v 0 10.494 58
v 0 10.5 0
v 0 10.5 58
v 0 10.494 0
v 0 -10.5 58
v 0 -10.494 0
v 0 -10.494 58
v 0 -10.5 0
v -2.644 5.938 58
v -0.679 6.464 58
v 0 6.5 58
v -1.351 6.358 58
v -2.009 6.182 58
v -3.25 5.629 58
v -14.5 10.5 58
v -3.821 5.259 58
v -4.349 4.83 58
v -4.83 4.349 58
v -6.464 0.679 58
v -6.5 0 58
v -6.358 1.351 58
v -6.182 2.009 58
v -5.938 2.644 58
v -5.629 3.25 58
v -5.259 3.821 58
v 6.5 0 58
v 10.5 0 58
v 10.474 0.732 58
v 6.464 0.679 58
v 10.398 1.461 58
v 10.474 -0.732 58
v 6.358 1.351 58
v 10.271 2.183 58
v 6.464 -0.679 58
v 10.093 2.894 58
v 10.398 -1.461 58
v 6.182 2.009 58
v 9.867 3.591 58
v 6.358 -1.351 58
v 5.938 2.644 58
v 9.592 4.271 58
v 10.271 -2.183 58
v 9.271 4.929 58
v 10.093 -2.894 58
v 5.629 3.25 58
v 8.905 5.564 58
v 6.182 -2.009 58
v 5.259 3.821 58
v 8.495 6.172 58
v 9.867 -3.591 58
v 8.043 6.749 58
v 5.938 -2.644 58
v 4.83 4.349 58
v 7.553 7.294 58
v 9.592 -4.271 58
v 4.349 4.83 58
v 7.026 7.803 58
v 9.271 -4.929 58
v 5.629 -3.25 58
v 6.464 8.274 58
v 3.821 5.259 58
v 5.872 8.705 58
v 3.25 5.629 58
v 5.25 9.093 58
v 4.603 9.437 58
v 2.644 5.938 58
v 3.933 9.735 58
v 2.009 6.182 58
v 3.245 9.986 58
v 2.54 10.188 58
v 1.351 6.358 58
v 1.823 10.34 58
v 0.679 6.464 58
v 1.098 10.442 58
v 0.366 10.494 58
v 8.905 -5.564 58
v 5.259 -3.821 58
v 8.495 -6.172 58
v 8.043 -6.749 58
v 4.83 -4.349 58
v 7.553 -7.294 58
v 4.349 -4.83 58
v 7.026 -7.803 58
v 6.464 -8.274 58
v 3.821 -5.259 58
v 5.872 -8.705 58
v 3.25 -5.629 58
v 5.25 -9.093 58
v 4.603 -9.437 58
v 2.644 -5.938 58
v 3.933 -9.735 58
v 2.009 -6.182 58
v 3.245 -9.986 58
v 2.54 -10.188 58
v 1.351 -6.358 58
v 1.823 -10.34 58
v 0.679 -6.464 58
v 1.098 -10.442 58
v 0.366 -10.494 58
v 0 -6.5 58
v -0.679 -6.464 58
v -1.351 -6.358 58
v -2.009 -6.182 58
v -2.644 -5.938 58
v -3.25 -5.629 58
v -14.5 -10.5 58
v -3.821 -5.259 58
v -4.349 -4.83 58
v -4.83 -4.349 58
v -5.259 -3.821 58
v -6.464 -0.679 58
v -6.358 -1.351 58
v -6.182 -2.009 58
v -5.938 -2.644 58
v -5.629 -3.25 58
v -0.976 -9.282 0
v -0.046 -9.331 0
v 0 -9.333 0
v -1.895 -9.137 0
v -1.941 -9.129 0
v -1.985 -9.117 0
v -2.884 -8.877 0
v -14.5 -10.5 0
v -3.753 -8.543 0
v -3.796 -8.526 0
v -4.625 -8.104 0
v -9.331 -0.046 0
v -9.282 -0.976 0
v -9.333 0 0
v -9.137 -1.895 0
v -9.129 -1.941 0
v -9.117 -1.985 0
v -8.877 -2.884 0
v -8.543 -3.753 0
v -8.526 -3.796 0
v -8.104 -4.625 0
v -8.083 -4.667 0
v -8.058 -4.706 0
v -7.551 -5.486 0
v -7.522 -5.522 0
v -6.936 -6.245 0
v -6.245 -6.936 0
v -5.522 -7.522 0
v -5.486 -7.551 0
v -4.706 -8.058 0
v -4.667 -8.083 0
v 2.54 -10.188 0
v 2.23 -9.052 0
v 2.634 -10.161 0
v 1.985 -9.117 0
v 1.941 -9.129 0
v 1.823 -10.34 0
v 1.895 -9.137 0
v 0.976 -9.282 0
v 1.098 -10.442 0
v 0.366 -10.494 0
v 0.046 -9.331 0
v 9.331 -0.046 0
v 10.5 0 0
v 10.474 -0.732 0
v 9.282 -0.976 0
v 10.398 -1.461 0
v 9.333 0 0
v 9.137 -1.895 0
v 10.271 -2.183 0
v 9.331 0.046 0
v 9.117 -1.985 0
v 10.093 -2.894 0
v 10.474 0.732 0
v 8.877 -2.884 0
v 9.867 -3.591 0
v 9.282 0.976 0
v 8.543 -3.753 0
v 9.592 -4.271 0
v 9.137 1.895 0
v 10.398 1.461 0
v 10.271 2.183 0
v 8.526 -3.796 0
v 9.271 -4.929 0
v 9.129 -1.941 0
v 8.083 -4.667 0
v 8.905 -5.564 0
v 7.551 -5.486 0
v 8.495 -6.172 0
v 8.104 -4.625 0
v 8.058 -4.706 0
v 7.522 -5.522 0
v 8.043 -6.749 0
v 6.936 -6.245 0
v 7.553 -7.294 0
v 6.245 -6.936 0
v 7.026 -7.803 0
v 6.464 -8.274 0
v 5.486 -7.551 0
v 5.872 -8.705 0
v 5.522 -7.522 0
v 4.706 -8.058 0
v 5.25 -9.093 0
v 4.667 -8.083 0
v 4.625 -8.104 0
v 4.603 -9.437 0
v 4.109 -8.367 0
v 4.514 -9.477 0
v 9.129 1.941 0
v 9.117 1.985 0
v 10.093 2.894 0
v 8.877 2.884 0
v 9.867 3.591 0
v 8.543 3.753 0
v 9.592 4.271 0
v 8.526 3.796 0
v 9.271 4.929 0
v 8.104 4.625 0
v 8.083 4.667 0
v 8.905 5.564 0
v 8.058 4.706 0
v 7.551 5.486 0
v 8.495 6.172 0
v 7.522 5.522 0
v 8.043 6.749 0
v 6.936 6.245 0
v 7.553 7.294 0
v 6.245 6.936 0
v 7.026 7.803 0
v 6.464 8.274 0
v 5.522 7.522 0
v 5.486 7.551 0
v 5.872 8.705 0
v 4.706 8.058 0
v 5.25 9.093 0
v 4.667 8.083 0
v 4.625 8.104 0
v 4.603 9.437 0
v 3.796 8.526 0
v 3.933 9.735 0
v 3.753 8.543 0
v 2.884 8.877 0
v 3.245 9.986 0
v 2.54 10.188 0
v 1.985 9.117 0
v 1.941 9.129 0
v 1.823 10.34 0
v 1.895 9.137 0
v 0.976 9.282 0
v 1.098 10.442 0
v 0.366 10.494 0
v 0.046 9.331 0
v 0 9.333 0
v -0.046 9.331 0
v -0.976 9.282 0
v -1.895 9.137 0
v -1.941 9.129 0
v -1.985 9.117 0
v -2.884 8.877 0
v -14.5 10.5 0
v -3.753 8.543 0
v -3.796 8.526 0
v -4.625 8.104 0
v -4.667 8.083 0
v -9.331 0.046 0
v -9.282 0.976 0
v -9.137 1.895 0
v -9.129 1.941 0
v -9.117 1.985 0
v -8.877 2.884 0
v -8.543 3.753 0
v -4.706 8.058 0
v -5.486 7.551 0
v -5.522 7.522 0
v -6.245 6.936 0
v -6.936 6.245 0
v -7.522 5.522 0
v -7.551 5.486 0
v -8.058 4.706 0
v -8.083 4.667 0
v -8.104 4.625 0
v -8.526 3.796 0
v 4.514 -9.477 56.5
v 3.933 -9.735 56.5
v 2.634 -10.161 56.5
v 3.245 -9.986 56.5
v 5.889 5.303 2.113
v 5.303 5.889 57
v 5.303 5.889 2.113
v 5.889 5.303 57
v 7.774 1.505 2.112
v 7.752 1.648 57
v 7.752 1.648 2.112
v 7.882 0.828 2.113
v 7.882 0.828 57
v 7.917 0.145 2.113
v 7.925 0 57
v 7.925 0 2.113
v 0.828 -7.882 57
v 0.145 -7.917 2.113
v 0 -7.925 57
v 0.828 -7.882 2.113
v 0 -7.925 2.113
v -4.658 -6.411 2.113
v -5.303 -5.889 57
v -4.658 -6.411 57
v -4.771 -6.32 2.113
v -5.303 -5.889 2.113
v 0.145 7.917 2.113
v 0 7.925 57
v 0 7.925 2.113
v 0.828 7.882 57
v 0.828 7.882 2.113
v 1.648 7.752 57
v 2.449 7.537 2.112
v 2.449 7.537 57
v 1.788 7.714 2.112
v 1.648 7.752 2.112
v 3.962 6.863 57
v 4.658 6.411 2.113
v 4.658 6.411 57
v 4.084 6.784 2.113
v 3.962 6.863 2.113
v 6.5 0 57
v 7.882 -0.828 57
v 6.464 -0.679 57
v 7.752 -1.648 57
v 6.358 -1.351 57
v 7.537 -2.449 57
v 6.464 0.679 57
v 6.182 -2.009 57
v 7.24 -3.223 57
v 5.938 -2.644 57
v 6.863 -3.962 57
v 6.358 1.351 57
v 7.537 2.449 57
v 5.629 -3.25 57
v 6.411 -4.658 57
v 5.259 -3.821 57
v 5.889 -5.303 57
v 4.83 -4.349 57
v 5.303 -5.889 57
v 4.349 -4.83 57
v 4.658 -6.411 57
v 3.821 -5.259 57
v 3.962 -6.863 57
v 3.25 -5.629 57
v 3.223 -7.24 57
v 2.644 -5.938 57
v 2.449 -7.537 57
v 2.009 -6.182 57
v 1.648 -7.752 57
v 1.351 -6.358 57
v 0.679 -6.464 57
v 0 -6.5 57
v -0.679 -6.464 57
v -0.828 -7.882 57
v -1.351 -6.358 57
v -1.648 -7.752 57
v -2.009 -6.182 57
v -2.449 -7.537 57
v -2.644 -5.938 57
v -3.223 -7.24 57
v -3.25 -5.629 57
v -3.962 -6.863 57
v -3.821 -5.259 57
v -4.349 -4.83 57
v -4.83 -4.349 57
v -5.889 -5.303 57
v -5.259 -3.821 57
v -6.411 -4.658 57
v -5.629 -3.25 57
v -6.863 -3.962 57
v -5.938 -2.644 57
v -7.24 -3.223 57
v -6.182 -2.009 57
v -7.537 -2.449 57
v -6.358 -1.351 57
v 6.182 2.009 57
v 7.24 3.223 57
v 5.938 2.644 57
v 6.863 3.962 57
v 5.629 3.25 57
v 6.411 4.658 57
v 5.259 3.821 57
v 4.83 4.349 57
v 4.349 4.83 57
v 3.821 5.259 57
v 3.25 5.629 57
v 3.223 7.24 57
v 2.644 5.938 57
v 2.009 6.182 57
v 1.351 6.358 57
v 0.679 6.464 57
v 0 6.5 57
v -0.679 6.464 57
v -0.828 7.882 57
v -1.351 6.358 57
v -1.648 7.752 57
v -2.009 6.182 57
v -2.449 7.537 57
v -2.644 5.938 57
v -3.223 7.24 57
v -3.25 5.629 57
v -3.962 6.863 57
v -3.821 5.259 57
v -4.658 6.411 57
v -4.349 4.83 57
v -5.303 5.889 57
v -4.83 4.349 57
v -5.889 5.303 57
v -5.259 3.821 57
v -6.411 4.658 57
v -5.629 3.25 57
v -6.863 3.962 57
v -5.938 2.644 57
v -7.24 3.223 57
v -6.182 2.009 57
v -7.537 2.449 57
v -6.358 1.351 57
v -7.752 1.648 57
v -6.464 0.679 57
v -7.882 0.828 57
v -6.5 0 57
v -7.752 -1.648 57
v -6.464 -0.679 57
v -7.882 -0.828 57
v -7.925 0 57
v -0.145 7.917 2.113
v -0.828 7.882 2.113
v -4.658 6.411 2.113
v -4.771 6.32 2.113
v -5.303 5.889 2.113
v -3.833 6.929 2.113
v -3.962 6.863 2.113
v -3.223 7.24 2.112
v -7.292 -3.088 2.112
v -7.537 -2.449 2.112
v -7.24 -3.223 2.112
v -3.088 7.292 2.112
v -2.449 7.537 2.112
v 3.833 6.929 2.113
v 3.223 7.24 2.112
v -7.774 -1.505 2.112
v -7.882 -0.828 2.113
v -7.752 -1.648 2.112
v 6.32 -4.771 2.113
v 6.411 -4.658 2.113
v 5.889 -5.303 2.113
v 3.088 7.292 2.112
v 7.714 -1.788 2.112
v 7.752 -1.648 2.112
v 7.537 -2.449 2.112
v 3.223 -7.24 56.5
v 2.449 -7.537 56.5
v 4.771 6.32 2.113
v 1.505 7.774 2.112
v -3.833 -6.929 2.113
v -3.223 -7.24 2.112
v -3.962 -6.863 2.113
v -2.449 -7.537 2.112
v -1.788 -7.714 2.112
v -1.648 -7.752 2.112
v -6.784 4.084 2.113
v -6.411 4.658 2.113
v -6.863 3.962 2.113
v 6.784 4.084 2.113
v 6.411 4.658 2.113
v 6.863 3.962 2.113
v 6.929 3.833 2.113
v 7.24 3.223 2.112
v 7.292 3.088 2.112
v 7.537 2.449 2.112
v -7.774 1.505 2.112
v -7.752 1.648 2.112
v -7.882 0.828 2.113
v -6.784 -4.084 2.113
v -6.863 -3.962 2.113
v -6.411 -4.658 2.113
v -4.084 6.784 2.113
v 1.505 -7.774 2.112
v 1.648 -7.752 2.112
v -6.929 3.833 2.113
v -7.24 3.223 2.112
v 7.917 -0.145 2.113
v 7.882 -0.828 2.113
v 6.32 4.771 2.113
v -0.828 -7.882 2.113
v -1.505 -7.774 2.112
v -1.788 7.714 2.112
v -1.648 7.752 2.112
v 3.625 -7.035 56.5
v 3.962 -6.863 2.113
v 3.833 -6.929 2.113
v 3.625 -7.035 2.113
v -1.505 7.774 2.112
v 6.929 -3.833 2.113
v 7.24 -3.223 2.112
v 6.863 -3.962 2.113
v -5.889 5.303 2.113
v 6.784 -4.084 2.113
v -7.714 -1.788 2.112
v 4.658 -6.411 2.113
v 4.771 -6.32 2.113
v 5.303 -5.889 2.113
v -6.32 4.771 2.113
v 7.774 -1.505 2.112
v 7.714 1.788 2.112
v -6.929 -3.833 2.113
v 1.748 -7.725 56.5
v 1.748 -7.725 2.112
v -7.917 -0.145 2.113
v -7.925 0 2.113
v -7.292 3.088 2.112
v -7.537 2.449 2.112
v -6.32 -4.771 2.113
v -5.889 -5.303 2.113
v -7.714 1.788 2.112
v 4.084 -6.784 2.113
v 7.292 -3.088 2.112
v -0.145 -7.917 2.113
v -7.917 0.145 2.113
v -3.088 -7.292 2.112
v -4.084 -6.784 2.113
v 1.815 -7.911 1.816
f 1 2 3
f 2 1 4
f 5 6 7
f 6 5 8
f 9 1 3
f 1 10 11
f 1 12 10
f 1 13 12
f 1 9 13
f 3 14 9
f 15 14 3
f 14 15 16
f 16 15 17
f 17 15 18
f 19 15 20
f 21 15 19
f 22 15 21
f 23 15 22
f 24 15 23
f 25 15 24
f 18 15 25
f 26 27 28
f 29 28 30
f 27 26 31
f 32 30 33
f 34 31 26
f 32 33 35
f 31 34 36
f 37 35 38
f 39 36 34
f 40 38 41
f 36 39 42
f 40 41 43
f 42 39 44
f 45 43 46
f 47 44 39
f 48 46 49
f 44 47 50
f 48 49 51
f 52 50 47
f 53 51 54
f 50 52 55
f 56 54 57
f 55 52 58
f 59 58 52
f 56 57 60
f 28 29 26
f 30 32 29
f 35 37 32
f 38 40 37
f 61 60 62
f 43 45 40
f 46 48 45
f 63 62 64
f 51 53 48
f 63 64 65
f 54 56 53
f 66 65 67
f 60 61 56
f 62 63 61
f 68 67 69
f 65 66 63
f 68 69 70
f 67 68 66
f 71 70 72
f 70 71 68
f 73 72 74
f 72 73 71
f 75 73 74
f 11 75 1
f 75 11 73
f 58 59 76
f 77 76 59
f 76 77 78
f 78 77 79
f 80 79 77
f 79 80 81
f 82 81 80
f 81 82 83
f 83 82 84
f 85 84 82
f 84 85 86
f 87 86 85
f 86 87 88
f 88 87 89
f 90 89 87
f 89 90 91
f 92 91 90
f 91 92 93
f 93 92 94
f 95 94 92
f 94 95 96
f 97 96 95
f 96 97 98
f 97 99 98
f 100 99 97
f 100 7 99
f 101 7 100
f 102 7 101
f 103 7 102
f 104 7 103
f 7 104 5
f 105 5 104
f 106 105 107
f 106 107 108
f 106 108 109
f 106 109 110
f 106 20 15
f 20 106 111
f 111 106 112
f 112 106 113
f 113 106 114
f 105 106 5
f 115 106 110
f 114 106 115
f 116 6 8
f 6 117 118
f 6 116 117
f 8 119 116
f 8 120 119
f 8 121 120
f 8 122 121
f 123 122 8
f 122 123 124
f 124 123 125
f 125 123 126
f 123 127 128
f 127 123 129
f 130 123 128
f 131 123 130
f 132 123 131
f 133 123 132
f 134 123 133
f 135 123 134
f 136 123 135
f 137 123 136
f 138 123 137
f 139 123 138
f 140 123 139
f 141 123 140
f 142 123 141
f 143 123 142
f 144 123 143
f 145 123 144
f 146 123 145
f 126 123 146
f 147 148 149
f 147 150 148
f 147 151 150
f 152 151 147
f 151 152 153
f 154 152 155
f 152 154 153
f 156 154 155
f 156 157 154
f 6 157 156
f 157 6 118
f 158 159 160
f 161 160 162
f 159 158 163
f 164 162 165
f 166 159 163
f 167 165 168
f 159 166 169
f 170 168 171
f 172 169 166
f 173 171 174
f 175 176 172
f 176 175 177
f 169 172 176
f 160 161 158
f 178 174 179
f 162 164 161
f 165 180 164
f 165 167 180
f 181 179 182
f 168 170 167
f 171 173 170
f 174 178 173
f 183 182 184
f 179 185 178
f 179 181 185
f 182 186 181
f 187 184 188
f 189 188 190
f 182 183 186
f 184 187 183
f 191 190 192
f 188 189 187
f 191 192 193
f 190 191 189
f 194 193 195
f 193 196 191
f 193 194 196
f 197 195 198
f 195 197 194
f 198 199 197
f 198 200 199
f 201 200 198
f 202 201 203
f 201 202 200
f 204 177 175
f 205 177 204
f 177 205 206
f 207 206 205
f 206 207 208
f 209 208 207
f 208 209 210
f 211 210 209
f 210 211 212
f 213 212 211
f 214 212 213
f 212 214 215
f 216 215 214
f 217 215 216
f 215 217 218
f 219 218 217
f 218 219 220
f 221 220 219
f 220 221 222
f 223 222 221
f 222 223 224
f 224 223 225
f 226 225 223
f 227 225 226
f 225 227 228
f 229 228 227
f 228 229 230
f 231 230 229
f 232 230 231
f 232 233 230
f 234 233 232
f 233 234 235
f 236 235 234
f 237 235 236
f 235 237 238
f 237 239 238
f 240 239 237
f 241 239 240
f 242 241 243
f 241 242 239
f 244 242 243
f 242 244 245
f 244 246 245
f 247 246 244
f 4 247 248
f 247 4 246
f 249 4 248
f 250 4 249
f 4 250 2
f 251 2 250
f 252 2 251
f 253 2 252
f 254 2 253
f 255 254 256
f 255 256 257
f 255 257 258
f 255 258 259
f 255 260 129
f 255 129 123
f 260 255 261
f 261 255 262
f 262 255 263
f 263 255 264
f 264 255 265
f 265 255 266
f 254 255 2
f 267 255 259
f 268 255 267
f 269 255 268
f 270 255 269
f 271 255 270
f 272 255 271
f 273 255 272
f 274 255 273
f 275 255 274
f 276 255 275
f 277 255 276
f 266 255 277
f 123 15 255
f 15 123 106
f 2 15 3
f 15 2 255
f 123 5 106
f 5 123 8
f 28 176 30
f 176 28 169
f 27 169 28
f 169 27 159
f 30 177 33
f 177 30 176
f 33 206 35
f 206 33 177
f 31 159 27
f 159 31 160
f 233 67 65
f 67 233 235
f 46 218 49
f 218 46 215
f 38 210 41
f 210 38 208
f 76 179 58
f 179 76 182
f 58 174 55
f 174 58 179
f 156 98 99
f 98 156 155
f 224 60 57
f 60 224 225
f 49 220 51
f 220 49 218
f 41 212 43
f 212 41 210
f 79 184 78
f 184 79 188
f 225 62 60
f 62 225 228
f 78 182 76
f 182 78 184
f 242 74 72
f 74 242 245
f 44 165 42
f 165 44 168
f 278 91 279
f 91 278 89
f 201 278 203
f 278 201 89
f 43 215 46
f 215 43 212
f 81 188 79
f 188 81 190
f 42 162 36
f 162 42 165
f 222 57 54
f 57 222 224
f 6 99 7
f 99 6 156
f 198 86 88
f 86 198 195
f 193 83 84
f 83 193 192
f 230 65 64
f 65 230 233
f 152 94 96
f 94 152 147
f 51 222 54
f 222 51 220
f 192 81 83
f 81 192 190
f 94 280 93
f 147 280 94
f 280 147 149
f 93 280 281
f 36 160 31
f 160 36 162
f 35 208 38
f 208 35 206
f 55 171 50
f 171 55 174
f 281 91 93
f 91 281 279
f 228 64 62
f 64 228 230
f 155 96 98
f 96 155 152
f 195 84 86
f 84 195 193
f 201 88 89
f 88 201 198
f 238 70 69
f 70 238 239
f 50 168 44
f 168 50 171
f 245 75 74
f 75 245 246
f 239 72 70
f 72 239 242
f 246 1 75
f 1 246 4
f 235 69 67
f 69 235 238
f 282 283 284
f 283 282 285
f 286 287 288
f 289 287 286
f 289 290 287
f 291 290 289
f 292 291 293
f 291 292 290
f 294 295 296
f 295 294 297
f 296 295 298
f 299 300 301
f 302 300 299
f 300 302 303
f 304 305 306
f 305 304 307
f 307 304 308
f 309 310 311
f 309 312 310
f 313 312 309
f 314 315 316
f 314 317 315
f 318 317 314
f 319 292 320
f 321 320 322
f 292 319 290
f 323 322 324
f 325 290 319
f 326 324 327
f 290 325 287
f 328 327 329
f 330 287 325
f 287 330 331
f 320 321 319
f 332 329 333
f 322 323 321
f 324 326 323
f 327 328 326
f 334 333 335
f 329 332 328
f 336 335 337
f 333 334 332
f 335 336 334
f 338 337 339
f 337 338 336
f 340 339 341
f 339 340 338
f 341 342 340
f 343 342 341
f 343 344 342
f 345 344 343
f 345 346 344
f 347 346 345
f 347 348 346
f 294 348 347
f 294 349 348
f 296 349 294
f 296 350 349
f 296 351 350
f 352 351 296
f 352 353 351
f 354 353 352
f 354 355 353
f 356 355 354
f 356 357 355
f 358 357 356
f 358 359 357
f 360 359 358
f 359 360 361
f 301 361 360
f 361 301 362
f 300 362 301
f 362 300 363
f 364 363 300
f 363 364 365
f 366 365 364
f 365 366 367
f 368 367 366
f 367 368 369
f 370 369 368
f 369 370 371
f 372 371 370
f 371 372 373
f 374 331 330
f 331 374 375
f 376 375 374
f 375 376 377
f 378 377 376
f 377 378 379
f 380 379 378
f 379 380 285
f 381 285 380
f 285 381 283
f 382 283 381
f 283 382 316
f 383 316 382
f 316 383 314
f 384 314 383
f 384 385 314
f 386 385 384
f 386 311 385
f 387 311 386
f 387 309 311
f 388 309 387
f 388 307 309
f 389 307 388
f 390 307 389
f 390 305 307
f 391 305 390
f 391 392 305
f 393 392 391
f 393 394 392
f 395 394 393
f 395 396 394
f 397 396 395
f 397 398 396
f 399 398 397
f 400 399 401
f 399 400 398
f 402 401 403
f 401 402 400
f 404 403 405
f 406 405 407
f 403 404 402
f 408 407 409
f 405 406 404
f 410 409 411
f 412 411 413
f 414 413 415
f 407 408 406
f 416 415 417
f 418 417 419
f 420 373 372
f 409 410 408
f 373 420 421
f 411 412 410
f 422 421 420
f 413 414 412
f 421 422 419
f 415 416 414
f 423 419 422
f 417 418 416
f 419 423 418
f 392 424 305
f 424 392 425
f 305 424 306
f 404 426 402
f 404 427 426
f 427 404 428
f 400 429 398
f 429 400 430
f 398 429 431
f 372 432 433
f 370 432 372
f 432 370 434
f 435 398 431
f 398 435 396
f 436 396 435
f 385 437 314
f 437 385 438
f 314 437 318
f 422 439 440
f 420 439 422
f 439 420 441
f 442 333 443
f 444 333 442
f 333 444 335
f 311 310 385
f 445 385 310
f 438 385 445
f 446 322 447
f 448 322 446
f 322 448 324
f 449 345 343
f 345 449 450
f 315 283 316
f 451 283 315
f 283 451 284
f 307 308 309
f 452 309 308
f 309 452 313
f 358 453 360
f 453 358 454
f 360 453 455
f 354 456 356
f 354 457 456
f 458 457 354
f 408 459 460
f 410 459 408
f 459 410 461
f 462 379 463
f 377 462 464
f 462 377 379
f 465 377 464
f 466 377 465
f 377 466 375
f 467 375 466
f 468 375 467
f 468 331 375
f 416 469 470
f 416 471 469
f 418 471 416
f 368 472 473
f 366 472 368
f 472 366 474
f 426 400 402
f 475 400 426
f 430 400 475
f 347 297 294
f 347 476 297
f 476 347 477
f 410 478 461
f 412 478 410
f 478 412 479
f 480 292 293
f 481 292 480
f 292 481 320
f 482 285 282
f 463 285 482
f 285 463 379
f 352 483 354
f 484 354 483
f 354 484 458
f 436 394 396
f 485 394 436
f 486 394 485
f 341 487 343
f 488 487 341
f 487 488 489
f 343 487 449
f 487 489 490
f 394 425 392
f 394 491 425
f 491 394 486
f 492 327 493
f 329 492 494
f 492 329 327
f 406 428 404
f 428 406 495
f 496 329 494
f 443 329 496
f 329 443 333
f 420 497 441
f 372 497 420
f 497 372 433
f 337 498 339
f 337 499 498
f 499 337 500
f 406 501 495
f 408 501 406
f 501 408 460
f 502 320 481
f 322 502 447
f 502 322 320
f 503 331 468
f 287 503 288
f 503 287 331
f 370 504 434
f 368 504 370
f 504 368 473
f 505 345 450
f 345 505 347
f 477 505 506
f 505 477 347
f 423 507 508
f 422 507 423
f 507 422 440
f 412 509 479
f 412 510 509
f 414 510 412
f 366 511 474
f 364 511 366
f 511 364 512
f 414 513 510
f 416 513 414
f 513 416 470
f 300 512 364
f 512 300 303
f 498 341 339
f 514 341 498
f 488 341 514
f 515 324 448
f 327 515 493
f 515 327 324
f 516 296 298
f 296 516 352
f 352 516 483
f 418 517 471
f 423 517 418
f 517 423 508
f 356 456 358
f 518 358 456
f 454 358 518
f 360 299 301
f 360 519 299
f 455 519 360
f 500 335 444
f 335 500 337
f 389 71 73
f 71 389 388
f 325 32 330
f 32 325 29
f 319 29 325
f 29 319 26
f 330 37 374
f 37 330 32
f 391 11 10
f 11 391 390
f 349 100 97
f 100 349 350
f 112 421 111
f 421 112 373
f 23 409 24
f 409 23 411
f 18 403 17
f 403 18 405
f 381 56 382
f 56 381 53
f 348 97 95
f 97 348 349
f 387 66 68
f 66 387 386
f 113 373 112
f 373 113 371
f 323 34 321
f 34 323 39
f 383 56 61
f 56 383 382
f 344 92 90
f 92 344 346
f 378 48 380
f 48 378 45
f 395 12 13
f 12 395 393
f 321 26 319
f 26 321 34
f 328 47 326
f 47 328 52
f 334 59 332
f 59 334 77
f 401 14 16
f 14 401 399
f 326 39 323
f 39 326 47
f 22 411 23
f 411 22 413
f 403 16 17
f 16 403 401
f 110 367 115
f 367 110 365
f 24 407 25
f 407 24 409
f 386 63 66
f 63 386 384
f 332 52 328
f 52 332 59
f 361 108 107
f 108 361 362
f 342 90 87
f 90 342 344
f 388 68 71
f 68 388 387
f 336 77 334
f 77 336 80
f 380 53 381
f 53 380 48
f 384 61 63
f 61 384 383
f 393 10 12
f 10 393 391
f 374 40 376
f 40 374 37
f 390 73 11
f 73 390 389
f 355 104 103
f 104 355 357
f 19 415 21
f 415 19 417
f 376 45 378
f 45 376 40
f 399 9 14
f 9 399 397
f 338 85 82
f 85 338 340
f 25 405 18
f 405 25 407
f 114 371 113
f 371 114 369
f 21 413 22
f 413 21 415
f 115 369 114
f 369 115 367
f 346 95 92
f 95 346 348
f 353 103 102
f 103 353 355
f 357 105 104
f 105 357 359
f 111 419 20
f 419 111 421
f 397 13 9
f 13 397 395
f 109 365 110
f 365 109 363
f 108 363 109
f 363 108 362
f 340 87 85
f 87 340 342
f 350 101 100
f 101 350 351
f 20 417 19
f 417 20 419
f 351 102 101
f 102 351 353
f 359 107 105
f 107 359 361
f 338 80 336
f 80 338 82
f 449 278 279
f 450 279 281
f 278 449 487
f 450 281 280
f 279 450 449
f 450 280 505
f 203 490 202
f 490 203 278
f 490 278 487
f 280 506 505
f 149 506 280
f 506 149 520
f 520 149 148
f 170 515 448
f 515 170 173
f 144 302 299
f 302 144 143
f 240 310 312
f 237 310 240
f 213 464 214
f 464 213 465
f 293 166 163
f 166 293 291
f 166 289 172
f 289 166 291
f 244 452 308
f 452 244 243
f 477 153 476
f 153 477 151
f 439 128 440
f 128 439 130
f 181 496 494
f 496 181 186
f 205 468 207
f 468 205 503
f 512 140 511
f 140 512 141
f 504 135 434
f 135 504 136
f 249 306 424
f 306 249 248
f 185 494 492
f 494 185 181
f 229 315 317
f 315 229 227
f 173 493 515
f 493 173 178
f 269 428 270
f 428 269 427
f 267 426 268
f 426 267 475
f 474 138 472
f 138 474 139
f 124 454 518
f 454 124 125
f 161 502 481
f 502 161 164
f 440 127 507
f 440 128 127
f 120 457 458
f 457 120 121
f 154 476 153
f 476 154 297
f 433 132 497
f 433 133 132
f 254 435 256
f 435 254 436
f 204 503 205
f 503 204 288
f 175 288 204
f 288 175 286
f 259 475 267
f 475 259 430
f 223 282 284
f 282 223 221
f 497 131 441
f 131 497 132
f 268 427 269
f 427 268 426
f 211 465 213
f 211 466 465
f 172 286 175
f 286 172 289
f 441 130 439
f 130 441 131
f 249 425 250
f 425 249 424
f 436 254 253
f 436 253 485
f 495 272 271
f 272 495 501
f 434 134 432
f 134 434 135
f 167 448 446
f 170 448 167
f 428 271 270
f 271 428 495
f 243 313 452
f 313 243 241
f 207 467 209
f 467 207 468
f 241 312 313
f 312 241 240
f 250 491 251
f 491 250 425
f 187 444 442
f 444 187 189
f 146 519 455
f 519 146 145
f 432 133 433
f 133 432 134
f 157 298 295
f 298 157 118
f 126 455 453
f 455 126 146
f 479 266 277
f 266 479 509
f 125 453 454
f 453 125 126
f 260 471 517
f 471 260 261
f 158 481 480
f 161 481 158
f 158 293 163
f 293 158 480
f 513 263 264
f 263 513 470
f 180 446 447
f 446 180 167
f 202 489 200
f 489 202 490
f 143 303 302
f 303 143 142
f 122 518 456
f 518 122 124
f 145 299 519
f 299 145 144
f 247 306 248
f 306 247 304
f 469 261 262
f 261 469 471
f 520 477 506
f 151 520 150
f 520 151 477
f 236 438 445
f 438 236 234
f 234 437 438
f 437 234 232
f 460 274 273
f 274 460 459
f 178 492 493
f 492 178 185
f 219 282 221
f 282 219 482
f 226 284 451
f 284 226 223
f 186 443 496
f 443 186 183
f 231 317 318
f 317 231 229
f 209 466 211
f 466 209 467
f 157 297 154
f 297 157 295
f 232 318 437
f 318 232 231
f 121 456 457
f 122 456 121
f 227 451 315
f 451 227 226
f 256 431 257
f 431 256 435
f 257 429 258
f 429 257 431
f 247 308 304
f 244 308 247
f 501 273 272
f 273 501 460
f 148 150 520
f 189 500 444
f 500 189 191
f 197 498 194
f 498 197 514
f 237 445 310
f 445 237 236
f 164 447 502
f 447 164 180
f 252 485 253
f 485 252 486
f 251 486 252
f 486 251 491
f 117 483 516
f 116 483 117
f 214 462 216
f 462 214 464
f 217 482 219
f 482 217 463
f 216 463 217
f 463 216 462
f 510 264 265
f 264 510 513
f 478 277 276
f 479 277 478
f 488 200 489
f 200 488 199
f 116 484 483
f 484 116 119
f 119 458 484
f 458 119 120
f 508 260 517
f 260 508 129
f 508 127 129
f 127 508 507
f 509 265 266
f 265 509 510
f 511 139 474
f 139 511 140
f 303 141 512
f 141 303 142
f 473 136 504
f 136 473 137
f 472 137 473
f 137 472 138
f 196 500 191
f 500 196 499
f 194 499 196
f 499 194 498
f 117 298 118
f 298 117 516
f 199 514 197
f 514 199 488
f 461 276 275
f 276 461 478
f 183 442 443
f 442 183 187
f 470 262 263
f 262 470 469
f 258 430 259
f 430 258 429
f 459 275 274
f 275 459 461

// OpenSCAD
// PRUSA iteration3
// Bearing holders
// GNU GPL v3
// Josef Průša <iam@josefprusa.cz> and contributors
// http://www.reprap.org/wiki/Prusa_Mendel
// http://prusamendel.org
// Alterations for Wilson by MRice <mrice411@gmail.com>

bearing_diameter = 15; 

module horizontal_bearing_base(bearings=1){
 translate(v=[0,0,6]) cube(size = [24,8+bearings*25,12], center = true);	
}
module horizontal_bearing_holes(bearings=1){
 cutter_lenght = 10+bearings*25;
 one_holder_lenght = 8+25;
 holder_lenght = 8+bearings*25;
 
 // Main bearing cut
 difference(){
  translate(v=[0,0,12]) 
      rotate(a=[90,0,0]) translate(v=[0,0,-cutter_lenght/2]) cylinder(h = cutter_lenght, r=bearing_diameter/2, $fn=50);
  // Bearing retainers
  translate(v=[0,1-holder_lenght/2,3]) cube(size = [24,6,8], center = true);
  translate(v=[0,-1+holder_lenght/2,3]) cube(size = [24,6,8], center = true);
 }
 
 // Ziptie cutouts
 ziptie_cut_ofset = 0;
 for ( i = [0 : bearings-1] ){
  // For easier positioning I move them by half of one 
  // bearing holder then add each bearign lenght and then center again
  translate(v=[0,-holder_lenght/2,0]) translate(v=[0,one_holder_lenght/2+i*25,0]) difference(){
   union(){
    translate(v=[0,2-6,12]) rotate(a=[90,0,0]) translate(v=[0,0,0]) cylinder(h = 4, r=12.5, $fn=50);
    translate(v=[0,2+6,12]) rotate(a=[90,0,0]) translate(v=[0,0,0]) cylinder(h = 4, r=12.5, $fn=50);
   }
   translate(v=[0,10,12]) rotate(a=[90,0,0]) translate(v=[0,0,0]) cylinder(h = 24, r=10, $fn=50);
  }
 }
 
}

module horizontal_bearing_test(){
 difference(){
  horizontal_bearing_base(1);
  horizontal_bearing_holes(1);
 }
 translate(v=[30,0,0]) difference(){
  horizontal_bearing_base(2);
  horizontal_bearing_holes(2);
 }
 translate(v=[60,0,0]) difference(){
  horizontal_bearing_base(3);
  horizontal_bearing_holes(3);
 }
}



thinwall = 3;
bearing_size = bearing_diameter + 2 * thinwall;

module vertical_bearing_base(){
 translate(v=[-2-bearing_size/4,0,29]) cube(size = [4+bearing_size/2,bearing_size,58], center = true);
 cylinder(h = 58, r=bearing_size/2, $fn = 90);
}

bearing_cut_extra = 0.425; // this 0.425 added to compensate for slicer error.

module vertical_bearing_holes(){
  #translate(v=[0,0,-4]) cylinder(h = 61, r=bearing_diameter/2 + bearing_cut_extra, $fn = 60);
  #translate(v=[0,0,49]) cylinder(h=10,r=bearing_diameter/2-1,$fn=60);
  #rotate(a=[0,0,-70]) translate(v=[8,0,27/*was 31.5 mjr*/]) cube(size = [5.4,2 /*was 1 mjr*/ ,59], center = true);
  #translate([0,0,-1]) cylinder(h=9,r1=bearing_diameter/2+thinwall/2+1,r2=4,$fn=60);
  //#translate([0,0,49]) cylinder(h=9,r2=bearing_diameter/2+thinwall/2,r1=4,$fn=60);
}

difference(){
vertical_bearing_base();
vertical_bearing_holes();
}
